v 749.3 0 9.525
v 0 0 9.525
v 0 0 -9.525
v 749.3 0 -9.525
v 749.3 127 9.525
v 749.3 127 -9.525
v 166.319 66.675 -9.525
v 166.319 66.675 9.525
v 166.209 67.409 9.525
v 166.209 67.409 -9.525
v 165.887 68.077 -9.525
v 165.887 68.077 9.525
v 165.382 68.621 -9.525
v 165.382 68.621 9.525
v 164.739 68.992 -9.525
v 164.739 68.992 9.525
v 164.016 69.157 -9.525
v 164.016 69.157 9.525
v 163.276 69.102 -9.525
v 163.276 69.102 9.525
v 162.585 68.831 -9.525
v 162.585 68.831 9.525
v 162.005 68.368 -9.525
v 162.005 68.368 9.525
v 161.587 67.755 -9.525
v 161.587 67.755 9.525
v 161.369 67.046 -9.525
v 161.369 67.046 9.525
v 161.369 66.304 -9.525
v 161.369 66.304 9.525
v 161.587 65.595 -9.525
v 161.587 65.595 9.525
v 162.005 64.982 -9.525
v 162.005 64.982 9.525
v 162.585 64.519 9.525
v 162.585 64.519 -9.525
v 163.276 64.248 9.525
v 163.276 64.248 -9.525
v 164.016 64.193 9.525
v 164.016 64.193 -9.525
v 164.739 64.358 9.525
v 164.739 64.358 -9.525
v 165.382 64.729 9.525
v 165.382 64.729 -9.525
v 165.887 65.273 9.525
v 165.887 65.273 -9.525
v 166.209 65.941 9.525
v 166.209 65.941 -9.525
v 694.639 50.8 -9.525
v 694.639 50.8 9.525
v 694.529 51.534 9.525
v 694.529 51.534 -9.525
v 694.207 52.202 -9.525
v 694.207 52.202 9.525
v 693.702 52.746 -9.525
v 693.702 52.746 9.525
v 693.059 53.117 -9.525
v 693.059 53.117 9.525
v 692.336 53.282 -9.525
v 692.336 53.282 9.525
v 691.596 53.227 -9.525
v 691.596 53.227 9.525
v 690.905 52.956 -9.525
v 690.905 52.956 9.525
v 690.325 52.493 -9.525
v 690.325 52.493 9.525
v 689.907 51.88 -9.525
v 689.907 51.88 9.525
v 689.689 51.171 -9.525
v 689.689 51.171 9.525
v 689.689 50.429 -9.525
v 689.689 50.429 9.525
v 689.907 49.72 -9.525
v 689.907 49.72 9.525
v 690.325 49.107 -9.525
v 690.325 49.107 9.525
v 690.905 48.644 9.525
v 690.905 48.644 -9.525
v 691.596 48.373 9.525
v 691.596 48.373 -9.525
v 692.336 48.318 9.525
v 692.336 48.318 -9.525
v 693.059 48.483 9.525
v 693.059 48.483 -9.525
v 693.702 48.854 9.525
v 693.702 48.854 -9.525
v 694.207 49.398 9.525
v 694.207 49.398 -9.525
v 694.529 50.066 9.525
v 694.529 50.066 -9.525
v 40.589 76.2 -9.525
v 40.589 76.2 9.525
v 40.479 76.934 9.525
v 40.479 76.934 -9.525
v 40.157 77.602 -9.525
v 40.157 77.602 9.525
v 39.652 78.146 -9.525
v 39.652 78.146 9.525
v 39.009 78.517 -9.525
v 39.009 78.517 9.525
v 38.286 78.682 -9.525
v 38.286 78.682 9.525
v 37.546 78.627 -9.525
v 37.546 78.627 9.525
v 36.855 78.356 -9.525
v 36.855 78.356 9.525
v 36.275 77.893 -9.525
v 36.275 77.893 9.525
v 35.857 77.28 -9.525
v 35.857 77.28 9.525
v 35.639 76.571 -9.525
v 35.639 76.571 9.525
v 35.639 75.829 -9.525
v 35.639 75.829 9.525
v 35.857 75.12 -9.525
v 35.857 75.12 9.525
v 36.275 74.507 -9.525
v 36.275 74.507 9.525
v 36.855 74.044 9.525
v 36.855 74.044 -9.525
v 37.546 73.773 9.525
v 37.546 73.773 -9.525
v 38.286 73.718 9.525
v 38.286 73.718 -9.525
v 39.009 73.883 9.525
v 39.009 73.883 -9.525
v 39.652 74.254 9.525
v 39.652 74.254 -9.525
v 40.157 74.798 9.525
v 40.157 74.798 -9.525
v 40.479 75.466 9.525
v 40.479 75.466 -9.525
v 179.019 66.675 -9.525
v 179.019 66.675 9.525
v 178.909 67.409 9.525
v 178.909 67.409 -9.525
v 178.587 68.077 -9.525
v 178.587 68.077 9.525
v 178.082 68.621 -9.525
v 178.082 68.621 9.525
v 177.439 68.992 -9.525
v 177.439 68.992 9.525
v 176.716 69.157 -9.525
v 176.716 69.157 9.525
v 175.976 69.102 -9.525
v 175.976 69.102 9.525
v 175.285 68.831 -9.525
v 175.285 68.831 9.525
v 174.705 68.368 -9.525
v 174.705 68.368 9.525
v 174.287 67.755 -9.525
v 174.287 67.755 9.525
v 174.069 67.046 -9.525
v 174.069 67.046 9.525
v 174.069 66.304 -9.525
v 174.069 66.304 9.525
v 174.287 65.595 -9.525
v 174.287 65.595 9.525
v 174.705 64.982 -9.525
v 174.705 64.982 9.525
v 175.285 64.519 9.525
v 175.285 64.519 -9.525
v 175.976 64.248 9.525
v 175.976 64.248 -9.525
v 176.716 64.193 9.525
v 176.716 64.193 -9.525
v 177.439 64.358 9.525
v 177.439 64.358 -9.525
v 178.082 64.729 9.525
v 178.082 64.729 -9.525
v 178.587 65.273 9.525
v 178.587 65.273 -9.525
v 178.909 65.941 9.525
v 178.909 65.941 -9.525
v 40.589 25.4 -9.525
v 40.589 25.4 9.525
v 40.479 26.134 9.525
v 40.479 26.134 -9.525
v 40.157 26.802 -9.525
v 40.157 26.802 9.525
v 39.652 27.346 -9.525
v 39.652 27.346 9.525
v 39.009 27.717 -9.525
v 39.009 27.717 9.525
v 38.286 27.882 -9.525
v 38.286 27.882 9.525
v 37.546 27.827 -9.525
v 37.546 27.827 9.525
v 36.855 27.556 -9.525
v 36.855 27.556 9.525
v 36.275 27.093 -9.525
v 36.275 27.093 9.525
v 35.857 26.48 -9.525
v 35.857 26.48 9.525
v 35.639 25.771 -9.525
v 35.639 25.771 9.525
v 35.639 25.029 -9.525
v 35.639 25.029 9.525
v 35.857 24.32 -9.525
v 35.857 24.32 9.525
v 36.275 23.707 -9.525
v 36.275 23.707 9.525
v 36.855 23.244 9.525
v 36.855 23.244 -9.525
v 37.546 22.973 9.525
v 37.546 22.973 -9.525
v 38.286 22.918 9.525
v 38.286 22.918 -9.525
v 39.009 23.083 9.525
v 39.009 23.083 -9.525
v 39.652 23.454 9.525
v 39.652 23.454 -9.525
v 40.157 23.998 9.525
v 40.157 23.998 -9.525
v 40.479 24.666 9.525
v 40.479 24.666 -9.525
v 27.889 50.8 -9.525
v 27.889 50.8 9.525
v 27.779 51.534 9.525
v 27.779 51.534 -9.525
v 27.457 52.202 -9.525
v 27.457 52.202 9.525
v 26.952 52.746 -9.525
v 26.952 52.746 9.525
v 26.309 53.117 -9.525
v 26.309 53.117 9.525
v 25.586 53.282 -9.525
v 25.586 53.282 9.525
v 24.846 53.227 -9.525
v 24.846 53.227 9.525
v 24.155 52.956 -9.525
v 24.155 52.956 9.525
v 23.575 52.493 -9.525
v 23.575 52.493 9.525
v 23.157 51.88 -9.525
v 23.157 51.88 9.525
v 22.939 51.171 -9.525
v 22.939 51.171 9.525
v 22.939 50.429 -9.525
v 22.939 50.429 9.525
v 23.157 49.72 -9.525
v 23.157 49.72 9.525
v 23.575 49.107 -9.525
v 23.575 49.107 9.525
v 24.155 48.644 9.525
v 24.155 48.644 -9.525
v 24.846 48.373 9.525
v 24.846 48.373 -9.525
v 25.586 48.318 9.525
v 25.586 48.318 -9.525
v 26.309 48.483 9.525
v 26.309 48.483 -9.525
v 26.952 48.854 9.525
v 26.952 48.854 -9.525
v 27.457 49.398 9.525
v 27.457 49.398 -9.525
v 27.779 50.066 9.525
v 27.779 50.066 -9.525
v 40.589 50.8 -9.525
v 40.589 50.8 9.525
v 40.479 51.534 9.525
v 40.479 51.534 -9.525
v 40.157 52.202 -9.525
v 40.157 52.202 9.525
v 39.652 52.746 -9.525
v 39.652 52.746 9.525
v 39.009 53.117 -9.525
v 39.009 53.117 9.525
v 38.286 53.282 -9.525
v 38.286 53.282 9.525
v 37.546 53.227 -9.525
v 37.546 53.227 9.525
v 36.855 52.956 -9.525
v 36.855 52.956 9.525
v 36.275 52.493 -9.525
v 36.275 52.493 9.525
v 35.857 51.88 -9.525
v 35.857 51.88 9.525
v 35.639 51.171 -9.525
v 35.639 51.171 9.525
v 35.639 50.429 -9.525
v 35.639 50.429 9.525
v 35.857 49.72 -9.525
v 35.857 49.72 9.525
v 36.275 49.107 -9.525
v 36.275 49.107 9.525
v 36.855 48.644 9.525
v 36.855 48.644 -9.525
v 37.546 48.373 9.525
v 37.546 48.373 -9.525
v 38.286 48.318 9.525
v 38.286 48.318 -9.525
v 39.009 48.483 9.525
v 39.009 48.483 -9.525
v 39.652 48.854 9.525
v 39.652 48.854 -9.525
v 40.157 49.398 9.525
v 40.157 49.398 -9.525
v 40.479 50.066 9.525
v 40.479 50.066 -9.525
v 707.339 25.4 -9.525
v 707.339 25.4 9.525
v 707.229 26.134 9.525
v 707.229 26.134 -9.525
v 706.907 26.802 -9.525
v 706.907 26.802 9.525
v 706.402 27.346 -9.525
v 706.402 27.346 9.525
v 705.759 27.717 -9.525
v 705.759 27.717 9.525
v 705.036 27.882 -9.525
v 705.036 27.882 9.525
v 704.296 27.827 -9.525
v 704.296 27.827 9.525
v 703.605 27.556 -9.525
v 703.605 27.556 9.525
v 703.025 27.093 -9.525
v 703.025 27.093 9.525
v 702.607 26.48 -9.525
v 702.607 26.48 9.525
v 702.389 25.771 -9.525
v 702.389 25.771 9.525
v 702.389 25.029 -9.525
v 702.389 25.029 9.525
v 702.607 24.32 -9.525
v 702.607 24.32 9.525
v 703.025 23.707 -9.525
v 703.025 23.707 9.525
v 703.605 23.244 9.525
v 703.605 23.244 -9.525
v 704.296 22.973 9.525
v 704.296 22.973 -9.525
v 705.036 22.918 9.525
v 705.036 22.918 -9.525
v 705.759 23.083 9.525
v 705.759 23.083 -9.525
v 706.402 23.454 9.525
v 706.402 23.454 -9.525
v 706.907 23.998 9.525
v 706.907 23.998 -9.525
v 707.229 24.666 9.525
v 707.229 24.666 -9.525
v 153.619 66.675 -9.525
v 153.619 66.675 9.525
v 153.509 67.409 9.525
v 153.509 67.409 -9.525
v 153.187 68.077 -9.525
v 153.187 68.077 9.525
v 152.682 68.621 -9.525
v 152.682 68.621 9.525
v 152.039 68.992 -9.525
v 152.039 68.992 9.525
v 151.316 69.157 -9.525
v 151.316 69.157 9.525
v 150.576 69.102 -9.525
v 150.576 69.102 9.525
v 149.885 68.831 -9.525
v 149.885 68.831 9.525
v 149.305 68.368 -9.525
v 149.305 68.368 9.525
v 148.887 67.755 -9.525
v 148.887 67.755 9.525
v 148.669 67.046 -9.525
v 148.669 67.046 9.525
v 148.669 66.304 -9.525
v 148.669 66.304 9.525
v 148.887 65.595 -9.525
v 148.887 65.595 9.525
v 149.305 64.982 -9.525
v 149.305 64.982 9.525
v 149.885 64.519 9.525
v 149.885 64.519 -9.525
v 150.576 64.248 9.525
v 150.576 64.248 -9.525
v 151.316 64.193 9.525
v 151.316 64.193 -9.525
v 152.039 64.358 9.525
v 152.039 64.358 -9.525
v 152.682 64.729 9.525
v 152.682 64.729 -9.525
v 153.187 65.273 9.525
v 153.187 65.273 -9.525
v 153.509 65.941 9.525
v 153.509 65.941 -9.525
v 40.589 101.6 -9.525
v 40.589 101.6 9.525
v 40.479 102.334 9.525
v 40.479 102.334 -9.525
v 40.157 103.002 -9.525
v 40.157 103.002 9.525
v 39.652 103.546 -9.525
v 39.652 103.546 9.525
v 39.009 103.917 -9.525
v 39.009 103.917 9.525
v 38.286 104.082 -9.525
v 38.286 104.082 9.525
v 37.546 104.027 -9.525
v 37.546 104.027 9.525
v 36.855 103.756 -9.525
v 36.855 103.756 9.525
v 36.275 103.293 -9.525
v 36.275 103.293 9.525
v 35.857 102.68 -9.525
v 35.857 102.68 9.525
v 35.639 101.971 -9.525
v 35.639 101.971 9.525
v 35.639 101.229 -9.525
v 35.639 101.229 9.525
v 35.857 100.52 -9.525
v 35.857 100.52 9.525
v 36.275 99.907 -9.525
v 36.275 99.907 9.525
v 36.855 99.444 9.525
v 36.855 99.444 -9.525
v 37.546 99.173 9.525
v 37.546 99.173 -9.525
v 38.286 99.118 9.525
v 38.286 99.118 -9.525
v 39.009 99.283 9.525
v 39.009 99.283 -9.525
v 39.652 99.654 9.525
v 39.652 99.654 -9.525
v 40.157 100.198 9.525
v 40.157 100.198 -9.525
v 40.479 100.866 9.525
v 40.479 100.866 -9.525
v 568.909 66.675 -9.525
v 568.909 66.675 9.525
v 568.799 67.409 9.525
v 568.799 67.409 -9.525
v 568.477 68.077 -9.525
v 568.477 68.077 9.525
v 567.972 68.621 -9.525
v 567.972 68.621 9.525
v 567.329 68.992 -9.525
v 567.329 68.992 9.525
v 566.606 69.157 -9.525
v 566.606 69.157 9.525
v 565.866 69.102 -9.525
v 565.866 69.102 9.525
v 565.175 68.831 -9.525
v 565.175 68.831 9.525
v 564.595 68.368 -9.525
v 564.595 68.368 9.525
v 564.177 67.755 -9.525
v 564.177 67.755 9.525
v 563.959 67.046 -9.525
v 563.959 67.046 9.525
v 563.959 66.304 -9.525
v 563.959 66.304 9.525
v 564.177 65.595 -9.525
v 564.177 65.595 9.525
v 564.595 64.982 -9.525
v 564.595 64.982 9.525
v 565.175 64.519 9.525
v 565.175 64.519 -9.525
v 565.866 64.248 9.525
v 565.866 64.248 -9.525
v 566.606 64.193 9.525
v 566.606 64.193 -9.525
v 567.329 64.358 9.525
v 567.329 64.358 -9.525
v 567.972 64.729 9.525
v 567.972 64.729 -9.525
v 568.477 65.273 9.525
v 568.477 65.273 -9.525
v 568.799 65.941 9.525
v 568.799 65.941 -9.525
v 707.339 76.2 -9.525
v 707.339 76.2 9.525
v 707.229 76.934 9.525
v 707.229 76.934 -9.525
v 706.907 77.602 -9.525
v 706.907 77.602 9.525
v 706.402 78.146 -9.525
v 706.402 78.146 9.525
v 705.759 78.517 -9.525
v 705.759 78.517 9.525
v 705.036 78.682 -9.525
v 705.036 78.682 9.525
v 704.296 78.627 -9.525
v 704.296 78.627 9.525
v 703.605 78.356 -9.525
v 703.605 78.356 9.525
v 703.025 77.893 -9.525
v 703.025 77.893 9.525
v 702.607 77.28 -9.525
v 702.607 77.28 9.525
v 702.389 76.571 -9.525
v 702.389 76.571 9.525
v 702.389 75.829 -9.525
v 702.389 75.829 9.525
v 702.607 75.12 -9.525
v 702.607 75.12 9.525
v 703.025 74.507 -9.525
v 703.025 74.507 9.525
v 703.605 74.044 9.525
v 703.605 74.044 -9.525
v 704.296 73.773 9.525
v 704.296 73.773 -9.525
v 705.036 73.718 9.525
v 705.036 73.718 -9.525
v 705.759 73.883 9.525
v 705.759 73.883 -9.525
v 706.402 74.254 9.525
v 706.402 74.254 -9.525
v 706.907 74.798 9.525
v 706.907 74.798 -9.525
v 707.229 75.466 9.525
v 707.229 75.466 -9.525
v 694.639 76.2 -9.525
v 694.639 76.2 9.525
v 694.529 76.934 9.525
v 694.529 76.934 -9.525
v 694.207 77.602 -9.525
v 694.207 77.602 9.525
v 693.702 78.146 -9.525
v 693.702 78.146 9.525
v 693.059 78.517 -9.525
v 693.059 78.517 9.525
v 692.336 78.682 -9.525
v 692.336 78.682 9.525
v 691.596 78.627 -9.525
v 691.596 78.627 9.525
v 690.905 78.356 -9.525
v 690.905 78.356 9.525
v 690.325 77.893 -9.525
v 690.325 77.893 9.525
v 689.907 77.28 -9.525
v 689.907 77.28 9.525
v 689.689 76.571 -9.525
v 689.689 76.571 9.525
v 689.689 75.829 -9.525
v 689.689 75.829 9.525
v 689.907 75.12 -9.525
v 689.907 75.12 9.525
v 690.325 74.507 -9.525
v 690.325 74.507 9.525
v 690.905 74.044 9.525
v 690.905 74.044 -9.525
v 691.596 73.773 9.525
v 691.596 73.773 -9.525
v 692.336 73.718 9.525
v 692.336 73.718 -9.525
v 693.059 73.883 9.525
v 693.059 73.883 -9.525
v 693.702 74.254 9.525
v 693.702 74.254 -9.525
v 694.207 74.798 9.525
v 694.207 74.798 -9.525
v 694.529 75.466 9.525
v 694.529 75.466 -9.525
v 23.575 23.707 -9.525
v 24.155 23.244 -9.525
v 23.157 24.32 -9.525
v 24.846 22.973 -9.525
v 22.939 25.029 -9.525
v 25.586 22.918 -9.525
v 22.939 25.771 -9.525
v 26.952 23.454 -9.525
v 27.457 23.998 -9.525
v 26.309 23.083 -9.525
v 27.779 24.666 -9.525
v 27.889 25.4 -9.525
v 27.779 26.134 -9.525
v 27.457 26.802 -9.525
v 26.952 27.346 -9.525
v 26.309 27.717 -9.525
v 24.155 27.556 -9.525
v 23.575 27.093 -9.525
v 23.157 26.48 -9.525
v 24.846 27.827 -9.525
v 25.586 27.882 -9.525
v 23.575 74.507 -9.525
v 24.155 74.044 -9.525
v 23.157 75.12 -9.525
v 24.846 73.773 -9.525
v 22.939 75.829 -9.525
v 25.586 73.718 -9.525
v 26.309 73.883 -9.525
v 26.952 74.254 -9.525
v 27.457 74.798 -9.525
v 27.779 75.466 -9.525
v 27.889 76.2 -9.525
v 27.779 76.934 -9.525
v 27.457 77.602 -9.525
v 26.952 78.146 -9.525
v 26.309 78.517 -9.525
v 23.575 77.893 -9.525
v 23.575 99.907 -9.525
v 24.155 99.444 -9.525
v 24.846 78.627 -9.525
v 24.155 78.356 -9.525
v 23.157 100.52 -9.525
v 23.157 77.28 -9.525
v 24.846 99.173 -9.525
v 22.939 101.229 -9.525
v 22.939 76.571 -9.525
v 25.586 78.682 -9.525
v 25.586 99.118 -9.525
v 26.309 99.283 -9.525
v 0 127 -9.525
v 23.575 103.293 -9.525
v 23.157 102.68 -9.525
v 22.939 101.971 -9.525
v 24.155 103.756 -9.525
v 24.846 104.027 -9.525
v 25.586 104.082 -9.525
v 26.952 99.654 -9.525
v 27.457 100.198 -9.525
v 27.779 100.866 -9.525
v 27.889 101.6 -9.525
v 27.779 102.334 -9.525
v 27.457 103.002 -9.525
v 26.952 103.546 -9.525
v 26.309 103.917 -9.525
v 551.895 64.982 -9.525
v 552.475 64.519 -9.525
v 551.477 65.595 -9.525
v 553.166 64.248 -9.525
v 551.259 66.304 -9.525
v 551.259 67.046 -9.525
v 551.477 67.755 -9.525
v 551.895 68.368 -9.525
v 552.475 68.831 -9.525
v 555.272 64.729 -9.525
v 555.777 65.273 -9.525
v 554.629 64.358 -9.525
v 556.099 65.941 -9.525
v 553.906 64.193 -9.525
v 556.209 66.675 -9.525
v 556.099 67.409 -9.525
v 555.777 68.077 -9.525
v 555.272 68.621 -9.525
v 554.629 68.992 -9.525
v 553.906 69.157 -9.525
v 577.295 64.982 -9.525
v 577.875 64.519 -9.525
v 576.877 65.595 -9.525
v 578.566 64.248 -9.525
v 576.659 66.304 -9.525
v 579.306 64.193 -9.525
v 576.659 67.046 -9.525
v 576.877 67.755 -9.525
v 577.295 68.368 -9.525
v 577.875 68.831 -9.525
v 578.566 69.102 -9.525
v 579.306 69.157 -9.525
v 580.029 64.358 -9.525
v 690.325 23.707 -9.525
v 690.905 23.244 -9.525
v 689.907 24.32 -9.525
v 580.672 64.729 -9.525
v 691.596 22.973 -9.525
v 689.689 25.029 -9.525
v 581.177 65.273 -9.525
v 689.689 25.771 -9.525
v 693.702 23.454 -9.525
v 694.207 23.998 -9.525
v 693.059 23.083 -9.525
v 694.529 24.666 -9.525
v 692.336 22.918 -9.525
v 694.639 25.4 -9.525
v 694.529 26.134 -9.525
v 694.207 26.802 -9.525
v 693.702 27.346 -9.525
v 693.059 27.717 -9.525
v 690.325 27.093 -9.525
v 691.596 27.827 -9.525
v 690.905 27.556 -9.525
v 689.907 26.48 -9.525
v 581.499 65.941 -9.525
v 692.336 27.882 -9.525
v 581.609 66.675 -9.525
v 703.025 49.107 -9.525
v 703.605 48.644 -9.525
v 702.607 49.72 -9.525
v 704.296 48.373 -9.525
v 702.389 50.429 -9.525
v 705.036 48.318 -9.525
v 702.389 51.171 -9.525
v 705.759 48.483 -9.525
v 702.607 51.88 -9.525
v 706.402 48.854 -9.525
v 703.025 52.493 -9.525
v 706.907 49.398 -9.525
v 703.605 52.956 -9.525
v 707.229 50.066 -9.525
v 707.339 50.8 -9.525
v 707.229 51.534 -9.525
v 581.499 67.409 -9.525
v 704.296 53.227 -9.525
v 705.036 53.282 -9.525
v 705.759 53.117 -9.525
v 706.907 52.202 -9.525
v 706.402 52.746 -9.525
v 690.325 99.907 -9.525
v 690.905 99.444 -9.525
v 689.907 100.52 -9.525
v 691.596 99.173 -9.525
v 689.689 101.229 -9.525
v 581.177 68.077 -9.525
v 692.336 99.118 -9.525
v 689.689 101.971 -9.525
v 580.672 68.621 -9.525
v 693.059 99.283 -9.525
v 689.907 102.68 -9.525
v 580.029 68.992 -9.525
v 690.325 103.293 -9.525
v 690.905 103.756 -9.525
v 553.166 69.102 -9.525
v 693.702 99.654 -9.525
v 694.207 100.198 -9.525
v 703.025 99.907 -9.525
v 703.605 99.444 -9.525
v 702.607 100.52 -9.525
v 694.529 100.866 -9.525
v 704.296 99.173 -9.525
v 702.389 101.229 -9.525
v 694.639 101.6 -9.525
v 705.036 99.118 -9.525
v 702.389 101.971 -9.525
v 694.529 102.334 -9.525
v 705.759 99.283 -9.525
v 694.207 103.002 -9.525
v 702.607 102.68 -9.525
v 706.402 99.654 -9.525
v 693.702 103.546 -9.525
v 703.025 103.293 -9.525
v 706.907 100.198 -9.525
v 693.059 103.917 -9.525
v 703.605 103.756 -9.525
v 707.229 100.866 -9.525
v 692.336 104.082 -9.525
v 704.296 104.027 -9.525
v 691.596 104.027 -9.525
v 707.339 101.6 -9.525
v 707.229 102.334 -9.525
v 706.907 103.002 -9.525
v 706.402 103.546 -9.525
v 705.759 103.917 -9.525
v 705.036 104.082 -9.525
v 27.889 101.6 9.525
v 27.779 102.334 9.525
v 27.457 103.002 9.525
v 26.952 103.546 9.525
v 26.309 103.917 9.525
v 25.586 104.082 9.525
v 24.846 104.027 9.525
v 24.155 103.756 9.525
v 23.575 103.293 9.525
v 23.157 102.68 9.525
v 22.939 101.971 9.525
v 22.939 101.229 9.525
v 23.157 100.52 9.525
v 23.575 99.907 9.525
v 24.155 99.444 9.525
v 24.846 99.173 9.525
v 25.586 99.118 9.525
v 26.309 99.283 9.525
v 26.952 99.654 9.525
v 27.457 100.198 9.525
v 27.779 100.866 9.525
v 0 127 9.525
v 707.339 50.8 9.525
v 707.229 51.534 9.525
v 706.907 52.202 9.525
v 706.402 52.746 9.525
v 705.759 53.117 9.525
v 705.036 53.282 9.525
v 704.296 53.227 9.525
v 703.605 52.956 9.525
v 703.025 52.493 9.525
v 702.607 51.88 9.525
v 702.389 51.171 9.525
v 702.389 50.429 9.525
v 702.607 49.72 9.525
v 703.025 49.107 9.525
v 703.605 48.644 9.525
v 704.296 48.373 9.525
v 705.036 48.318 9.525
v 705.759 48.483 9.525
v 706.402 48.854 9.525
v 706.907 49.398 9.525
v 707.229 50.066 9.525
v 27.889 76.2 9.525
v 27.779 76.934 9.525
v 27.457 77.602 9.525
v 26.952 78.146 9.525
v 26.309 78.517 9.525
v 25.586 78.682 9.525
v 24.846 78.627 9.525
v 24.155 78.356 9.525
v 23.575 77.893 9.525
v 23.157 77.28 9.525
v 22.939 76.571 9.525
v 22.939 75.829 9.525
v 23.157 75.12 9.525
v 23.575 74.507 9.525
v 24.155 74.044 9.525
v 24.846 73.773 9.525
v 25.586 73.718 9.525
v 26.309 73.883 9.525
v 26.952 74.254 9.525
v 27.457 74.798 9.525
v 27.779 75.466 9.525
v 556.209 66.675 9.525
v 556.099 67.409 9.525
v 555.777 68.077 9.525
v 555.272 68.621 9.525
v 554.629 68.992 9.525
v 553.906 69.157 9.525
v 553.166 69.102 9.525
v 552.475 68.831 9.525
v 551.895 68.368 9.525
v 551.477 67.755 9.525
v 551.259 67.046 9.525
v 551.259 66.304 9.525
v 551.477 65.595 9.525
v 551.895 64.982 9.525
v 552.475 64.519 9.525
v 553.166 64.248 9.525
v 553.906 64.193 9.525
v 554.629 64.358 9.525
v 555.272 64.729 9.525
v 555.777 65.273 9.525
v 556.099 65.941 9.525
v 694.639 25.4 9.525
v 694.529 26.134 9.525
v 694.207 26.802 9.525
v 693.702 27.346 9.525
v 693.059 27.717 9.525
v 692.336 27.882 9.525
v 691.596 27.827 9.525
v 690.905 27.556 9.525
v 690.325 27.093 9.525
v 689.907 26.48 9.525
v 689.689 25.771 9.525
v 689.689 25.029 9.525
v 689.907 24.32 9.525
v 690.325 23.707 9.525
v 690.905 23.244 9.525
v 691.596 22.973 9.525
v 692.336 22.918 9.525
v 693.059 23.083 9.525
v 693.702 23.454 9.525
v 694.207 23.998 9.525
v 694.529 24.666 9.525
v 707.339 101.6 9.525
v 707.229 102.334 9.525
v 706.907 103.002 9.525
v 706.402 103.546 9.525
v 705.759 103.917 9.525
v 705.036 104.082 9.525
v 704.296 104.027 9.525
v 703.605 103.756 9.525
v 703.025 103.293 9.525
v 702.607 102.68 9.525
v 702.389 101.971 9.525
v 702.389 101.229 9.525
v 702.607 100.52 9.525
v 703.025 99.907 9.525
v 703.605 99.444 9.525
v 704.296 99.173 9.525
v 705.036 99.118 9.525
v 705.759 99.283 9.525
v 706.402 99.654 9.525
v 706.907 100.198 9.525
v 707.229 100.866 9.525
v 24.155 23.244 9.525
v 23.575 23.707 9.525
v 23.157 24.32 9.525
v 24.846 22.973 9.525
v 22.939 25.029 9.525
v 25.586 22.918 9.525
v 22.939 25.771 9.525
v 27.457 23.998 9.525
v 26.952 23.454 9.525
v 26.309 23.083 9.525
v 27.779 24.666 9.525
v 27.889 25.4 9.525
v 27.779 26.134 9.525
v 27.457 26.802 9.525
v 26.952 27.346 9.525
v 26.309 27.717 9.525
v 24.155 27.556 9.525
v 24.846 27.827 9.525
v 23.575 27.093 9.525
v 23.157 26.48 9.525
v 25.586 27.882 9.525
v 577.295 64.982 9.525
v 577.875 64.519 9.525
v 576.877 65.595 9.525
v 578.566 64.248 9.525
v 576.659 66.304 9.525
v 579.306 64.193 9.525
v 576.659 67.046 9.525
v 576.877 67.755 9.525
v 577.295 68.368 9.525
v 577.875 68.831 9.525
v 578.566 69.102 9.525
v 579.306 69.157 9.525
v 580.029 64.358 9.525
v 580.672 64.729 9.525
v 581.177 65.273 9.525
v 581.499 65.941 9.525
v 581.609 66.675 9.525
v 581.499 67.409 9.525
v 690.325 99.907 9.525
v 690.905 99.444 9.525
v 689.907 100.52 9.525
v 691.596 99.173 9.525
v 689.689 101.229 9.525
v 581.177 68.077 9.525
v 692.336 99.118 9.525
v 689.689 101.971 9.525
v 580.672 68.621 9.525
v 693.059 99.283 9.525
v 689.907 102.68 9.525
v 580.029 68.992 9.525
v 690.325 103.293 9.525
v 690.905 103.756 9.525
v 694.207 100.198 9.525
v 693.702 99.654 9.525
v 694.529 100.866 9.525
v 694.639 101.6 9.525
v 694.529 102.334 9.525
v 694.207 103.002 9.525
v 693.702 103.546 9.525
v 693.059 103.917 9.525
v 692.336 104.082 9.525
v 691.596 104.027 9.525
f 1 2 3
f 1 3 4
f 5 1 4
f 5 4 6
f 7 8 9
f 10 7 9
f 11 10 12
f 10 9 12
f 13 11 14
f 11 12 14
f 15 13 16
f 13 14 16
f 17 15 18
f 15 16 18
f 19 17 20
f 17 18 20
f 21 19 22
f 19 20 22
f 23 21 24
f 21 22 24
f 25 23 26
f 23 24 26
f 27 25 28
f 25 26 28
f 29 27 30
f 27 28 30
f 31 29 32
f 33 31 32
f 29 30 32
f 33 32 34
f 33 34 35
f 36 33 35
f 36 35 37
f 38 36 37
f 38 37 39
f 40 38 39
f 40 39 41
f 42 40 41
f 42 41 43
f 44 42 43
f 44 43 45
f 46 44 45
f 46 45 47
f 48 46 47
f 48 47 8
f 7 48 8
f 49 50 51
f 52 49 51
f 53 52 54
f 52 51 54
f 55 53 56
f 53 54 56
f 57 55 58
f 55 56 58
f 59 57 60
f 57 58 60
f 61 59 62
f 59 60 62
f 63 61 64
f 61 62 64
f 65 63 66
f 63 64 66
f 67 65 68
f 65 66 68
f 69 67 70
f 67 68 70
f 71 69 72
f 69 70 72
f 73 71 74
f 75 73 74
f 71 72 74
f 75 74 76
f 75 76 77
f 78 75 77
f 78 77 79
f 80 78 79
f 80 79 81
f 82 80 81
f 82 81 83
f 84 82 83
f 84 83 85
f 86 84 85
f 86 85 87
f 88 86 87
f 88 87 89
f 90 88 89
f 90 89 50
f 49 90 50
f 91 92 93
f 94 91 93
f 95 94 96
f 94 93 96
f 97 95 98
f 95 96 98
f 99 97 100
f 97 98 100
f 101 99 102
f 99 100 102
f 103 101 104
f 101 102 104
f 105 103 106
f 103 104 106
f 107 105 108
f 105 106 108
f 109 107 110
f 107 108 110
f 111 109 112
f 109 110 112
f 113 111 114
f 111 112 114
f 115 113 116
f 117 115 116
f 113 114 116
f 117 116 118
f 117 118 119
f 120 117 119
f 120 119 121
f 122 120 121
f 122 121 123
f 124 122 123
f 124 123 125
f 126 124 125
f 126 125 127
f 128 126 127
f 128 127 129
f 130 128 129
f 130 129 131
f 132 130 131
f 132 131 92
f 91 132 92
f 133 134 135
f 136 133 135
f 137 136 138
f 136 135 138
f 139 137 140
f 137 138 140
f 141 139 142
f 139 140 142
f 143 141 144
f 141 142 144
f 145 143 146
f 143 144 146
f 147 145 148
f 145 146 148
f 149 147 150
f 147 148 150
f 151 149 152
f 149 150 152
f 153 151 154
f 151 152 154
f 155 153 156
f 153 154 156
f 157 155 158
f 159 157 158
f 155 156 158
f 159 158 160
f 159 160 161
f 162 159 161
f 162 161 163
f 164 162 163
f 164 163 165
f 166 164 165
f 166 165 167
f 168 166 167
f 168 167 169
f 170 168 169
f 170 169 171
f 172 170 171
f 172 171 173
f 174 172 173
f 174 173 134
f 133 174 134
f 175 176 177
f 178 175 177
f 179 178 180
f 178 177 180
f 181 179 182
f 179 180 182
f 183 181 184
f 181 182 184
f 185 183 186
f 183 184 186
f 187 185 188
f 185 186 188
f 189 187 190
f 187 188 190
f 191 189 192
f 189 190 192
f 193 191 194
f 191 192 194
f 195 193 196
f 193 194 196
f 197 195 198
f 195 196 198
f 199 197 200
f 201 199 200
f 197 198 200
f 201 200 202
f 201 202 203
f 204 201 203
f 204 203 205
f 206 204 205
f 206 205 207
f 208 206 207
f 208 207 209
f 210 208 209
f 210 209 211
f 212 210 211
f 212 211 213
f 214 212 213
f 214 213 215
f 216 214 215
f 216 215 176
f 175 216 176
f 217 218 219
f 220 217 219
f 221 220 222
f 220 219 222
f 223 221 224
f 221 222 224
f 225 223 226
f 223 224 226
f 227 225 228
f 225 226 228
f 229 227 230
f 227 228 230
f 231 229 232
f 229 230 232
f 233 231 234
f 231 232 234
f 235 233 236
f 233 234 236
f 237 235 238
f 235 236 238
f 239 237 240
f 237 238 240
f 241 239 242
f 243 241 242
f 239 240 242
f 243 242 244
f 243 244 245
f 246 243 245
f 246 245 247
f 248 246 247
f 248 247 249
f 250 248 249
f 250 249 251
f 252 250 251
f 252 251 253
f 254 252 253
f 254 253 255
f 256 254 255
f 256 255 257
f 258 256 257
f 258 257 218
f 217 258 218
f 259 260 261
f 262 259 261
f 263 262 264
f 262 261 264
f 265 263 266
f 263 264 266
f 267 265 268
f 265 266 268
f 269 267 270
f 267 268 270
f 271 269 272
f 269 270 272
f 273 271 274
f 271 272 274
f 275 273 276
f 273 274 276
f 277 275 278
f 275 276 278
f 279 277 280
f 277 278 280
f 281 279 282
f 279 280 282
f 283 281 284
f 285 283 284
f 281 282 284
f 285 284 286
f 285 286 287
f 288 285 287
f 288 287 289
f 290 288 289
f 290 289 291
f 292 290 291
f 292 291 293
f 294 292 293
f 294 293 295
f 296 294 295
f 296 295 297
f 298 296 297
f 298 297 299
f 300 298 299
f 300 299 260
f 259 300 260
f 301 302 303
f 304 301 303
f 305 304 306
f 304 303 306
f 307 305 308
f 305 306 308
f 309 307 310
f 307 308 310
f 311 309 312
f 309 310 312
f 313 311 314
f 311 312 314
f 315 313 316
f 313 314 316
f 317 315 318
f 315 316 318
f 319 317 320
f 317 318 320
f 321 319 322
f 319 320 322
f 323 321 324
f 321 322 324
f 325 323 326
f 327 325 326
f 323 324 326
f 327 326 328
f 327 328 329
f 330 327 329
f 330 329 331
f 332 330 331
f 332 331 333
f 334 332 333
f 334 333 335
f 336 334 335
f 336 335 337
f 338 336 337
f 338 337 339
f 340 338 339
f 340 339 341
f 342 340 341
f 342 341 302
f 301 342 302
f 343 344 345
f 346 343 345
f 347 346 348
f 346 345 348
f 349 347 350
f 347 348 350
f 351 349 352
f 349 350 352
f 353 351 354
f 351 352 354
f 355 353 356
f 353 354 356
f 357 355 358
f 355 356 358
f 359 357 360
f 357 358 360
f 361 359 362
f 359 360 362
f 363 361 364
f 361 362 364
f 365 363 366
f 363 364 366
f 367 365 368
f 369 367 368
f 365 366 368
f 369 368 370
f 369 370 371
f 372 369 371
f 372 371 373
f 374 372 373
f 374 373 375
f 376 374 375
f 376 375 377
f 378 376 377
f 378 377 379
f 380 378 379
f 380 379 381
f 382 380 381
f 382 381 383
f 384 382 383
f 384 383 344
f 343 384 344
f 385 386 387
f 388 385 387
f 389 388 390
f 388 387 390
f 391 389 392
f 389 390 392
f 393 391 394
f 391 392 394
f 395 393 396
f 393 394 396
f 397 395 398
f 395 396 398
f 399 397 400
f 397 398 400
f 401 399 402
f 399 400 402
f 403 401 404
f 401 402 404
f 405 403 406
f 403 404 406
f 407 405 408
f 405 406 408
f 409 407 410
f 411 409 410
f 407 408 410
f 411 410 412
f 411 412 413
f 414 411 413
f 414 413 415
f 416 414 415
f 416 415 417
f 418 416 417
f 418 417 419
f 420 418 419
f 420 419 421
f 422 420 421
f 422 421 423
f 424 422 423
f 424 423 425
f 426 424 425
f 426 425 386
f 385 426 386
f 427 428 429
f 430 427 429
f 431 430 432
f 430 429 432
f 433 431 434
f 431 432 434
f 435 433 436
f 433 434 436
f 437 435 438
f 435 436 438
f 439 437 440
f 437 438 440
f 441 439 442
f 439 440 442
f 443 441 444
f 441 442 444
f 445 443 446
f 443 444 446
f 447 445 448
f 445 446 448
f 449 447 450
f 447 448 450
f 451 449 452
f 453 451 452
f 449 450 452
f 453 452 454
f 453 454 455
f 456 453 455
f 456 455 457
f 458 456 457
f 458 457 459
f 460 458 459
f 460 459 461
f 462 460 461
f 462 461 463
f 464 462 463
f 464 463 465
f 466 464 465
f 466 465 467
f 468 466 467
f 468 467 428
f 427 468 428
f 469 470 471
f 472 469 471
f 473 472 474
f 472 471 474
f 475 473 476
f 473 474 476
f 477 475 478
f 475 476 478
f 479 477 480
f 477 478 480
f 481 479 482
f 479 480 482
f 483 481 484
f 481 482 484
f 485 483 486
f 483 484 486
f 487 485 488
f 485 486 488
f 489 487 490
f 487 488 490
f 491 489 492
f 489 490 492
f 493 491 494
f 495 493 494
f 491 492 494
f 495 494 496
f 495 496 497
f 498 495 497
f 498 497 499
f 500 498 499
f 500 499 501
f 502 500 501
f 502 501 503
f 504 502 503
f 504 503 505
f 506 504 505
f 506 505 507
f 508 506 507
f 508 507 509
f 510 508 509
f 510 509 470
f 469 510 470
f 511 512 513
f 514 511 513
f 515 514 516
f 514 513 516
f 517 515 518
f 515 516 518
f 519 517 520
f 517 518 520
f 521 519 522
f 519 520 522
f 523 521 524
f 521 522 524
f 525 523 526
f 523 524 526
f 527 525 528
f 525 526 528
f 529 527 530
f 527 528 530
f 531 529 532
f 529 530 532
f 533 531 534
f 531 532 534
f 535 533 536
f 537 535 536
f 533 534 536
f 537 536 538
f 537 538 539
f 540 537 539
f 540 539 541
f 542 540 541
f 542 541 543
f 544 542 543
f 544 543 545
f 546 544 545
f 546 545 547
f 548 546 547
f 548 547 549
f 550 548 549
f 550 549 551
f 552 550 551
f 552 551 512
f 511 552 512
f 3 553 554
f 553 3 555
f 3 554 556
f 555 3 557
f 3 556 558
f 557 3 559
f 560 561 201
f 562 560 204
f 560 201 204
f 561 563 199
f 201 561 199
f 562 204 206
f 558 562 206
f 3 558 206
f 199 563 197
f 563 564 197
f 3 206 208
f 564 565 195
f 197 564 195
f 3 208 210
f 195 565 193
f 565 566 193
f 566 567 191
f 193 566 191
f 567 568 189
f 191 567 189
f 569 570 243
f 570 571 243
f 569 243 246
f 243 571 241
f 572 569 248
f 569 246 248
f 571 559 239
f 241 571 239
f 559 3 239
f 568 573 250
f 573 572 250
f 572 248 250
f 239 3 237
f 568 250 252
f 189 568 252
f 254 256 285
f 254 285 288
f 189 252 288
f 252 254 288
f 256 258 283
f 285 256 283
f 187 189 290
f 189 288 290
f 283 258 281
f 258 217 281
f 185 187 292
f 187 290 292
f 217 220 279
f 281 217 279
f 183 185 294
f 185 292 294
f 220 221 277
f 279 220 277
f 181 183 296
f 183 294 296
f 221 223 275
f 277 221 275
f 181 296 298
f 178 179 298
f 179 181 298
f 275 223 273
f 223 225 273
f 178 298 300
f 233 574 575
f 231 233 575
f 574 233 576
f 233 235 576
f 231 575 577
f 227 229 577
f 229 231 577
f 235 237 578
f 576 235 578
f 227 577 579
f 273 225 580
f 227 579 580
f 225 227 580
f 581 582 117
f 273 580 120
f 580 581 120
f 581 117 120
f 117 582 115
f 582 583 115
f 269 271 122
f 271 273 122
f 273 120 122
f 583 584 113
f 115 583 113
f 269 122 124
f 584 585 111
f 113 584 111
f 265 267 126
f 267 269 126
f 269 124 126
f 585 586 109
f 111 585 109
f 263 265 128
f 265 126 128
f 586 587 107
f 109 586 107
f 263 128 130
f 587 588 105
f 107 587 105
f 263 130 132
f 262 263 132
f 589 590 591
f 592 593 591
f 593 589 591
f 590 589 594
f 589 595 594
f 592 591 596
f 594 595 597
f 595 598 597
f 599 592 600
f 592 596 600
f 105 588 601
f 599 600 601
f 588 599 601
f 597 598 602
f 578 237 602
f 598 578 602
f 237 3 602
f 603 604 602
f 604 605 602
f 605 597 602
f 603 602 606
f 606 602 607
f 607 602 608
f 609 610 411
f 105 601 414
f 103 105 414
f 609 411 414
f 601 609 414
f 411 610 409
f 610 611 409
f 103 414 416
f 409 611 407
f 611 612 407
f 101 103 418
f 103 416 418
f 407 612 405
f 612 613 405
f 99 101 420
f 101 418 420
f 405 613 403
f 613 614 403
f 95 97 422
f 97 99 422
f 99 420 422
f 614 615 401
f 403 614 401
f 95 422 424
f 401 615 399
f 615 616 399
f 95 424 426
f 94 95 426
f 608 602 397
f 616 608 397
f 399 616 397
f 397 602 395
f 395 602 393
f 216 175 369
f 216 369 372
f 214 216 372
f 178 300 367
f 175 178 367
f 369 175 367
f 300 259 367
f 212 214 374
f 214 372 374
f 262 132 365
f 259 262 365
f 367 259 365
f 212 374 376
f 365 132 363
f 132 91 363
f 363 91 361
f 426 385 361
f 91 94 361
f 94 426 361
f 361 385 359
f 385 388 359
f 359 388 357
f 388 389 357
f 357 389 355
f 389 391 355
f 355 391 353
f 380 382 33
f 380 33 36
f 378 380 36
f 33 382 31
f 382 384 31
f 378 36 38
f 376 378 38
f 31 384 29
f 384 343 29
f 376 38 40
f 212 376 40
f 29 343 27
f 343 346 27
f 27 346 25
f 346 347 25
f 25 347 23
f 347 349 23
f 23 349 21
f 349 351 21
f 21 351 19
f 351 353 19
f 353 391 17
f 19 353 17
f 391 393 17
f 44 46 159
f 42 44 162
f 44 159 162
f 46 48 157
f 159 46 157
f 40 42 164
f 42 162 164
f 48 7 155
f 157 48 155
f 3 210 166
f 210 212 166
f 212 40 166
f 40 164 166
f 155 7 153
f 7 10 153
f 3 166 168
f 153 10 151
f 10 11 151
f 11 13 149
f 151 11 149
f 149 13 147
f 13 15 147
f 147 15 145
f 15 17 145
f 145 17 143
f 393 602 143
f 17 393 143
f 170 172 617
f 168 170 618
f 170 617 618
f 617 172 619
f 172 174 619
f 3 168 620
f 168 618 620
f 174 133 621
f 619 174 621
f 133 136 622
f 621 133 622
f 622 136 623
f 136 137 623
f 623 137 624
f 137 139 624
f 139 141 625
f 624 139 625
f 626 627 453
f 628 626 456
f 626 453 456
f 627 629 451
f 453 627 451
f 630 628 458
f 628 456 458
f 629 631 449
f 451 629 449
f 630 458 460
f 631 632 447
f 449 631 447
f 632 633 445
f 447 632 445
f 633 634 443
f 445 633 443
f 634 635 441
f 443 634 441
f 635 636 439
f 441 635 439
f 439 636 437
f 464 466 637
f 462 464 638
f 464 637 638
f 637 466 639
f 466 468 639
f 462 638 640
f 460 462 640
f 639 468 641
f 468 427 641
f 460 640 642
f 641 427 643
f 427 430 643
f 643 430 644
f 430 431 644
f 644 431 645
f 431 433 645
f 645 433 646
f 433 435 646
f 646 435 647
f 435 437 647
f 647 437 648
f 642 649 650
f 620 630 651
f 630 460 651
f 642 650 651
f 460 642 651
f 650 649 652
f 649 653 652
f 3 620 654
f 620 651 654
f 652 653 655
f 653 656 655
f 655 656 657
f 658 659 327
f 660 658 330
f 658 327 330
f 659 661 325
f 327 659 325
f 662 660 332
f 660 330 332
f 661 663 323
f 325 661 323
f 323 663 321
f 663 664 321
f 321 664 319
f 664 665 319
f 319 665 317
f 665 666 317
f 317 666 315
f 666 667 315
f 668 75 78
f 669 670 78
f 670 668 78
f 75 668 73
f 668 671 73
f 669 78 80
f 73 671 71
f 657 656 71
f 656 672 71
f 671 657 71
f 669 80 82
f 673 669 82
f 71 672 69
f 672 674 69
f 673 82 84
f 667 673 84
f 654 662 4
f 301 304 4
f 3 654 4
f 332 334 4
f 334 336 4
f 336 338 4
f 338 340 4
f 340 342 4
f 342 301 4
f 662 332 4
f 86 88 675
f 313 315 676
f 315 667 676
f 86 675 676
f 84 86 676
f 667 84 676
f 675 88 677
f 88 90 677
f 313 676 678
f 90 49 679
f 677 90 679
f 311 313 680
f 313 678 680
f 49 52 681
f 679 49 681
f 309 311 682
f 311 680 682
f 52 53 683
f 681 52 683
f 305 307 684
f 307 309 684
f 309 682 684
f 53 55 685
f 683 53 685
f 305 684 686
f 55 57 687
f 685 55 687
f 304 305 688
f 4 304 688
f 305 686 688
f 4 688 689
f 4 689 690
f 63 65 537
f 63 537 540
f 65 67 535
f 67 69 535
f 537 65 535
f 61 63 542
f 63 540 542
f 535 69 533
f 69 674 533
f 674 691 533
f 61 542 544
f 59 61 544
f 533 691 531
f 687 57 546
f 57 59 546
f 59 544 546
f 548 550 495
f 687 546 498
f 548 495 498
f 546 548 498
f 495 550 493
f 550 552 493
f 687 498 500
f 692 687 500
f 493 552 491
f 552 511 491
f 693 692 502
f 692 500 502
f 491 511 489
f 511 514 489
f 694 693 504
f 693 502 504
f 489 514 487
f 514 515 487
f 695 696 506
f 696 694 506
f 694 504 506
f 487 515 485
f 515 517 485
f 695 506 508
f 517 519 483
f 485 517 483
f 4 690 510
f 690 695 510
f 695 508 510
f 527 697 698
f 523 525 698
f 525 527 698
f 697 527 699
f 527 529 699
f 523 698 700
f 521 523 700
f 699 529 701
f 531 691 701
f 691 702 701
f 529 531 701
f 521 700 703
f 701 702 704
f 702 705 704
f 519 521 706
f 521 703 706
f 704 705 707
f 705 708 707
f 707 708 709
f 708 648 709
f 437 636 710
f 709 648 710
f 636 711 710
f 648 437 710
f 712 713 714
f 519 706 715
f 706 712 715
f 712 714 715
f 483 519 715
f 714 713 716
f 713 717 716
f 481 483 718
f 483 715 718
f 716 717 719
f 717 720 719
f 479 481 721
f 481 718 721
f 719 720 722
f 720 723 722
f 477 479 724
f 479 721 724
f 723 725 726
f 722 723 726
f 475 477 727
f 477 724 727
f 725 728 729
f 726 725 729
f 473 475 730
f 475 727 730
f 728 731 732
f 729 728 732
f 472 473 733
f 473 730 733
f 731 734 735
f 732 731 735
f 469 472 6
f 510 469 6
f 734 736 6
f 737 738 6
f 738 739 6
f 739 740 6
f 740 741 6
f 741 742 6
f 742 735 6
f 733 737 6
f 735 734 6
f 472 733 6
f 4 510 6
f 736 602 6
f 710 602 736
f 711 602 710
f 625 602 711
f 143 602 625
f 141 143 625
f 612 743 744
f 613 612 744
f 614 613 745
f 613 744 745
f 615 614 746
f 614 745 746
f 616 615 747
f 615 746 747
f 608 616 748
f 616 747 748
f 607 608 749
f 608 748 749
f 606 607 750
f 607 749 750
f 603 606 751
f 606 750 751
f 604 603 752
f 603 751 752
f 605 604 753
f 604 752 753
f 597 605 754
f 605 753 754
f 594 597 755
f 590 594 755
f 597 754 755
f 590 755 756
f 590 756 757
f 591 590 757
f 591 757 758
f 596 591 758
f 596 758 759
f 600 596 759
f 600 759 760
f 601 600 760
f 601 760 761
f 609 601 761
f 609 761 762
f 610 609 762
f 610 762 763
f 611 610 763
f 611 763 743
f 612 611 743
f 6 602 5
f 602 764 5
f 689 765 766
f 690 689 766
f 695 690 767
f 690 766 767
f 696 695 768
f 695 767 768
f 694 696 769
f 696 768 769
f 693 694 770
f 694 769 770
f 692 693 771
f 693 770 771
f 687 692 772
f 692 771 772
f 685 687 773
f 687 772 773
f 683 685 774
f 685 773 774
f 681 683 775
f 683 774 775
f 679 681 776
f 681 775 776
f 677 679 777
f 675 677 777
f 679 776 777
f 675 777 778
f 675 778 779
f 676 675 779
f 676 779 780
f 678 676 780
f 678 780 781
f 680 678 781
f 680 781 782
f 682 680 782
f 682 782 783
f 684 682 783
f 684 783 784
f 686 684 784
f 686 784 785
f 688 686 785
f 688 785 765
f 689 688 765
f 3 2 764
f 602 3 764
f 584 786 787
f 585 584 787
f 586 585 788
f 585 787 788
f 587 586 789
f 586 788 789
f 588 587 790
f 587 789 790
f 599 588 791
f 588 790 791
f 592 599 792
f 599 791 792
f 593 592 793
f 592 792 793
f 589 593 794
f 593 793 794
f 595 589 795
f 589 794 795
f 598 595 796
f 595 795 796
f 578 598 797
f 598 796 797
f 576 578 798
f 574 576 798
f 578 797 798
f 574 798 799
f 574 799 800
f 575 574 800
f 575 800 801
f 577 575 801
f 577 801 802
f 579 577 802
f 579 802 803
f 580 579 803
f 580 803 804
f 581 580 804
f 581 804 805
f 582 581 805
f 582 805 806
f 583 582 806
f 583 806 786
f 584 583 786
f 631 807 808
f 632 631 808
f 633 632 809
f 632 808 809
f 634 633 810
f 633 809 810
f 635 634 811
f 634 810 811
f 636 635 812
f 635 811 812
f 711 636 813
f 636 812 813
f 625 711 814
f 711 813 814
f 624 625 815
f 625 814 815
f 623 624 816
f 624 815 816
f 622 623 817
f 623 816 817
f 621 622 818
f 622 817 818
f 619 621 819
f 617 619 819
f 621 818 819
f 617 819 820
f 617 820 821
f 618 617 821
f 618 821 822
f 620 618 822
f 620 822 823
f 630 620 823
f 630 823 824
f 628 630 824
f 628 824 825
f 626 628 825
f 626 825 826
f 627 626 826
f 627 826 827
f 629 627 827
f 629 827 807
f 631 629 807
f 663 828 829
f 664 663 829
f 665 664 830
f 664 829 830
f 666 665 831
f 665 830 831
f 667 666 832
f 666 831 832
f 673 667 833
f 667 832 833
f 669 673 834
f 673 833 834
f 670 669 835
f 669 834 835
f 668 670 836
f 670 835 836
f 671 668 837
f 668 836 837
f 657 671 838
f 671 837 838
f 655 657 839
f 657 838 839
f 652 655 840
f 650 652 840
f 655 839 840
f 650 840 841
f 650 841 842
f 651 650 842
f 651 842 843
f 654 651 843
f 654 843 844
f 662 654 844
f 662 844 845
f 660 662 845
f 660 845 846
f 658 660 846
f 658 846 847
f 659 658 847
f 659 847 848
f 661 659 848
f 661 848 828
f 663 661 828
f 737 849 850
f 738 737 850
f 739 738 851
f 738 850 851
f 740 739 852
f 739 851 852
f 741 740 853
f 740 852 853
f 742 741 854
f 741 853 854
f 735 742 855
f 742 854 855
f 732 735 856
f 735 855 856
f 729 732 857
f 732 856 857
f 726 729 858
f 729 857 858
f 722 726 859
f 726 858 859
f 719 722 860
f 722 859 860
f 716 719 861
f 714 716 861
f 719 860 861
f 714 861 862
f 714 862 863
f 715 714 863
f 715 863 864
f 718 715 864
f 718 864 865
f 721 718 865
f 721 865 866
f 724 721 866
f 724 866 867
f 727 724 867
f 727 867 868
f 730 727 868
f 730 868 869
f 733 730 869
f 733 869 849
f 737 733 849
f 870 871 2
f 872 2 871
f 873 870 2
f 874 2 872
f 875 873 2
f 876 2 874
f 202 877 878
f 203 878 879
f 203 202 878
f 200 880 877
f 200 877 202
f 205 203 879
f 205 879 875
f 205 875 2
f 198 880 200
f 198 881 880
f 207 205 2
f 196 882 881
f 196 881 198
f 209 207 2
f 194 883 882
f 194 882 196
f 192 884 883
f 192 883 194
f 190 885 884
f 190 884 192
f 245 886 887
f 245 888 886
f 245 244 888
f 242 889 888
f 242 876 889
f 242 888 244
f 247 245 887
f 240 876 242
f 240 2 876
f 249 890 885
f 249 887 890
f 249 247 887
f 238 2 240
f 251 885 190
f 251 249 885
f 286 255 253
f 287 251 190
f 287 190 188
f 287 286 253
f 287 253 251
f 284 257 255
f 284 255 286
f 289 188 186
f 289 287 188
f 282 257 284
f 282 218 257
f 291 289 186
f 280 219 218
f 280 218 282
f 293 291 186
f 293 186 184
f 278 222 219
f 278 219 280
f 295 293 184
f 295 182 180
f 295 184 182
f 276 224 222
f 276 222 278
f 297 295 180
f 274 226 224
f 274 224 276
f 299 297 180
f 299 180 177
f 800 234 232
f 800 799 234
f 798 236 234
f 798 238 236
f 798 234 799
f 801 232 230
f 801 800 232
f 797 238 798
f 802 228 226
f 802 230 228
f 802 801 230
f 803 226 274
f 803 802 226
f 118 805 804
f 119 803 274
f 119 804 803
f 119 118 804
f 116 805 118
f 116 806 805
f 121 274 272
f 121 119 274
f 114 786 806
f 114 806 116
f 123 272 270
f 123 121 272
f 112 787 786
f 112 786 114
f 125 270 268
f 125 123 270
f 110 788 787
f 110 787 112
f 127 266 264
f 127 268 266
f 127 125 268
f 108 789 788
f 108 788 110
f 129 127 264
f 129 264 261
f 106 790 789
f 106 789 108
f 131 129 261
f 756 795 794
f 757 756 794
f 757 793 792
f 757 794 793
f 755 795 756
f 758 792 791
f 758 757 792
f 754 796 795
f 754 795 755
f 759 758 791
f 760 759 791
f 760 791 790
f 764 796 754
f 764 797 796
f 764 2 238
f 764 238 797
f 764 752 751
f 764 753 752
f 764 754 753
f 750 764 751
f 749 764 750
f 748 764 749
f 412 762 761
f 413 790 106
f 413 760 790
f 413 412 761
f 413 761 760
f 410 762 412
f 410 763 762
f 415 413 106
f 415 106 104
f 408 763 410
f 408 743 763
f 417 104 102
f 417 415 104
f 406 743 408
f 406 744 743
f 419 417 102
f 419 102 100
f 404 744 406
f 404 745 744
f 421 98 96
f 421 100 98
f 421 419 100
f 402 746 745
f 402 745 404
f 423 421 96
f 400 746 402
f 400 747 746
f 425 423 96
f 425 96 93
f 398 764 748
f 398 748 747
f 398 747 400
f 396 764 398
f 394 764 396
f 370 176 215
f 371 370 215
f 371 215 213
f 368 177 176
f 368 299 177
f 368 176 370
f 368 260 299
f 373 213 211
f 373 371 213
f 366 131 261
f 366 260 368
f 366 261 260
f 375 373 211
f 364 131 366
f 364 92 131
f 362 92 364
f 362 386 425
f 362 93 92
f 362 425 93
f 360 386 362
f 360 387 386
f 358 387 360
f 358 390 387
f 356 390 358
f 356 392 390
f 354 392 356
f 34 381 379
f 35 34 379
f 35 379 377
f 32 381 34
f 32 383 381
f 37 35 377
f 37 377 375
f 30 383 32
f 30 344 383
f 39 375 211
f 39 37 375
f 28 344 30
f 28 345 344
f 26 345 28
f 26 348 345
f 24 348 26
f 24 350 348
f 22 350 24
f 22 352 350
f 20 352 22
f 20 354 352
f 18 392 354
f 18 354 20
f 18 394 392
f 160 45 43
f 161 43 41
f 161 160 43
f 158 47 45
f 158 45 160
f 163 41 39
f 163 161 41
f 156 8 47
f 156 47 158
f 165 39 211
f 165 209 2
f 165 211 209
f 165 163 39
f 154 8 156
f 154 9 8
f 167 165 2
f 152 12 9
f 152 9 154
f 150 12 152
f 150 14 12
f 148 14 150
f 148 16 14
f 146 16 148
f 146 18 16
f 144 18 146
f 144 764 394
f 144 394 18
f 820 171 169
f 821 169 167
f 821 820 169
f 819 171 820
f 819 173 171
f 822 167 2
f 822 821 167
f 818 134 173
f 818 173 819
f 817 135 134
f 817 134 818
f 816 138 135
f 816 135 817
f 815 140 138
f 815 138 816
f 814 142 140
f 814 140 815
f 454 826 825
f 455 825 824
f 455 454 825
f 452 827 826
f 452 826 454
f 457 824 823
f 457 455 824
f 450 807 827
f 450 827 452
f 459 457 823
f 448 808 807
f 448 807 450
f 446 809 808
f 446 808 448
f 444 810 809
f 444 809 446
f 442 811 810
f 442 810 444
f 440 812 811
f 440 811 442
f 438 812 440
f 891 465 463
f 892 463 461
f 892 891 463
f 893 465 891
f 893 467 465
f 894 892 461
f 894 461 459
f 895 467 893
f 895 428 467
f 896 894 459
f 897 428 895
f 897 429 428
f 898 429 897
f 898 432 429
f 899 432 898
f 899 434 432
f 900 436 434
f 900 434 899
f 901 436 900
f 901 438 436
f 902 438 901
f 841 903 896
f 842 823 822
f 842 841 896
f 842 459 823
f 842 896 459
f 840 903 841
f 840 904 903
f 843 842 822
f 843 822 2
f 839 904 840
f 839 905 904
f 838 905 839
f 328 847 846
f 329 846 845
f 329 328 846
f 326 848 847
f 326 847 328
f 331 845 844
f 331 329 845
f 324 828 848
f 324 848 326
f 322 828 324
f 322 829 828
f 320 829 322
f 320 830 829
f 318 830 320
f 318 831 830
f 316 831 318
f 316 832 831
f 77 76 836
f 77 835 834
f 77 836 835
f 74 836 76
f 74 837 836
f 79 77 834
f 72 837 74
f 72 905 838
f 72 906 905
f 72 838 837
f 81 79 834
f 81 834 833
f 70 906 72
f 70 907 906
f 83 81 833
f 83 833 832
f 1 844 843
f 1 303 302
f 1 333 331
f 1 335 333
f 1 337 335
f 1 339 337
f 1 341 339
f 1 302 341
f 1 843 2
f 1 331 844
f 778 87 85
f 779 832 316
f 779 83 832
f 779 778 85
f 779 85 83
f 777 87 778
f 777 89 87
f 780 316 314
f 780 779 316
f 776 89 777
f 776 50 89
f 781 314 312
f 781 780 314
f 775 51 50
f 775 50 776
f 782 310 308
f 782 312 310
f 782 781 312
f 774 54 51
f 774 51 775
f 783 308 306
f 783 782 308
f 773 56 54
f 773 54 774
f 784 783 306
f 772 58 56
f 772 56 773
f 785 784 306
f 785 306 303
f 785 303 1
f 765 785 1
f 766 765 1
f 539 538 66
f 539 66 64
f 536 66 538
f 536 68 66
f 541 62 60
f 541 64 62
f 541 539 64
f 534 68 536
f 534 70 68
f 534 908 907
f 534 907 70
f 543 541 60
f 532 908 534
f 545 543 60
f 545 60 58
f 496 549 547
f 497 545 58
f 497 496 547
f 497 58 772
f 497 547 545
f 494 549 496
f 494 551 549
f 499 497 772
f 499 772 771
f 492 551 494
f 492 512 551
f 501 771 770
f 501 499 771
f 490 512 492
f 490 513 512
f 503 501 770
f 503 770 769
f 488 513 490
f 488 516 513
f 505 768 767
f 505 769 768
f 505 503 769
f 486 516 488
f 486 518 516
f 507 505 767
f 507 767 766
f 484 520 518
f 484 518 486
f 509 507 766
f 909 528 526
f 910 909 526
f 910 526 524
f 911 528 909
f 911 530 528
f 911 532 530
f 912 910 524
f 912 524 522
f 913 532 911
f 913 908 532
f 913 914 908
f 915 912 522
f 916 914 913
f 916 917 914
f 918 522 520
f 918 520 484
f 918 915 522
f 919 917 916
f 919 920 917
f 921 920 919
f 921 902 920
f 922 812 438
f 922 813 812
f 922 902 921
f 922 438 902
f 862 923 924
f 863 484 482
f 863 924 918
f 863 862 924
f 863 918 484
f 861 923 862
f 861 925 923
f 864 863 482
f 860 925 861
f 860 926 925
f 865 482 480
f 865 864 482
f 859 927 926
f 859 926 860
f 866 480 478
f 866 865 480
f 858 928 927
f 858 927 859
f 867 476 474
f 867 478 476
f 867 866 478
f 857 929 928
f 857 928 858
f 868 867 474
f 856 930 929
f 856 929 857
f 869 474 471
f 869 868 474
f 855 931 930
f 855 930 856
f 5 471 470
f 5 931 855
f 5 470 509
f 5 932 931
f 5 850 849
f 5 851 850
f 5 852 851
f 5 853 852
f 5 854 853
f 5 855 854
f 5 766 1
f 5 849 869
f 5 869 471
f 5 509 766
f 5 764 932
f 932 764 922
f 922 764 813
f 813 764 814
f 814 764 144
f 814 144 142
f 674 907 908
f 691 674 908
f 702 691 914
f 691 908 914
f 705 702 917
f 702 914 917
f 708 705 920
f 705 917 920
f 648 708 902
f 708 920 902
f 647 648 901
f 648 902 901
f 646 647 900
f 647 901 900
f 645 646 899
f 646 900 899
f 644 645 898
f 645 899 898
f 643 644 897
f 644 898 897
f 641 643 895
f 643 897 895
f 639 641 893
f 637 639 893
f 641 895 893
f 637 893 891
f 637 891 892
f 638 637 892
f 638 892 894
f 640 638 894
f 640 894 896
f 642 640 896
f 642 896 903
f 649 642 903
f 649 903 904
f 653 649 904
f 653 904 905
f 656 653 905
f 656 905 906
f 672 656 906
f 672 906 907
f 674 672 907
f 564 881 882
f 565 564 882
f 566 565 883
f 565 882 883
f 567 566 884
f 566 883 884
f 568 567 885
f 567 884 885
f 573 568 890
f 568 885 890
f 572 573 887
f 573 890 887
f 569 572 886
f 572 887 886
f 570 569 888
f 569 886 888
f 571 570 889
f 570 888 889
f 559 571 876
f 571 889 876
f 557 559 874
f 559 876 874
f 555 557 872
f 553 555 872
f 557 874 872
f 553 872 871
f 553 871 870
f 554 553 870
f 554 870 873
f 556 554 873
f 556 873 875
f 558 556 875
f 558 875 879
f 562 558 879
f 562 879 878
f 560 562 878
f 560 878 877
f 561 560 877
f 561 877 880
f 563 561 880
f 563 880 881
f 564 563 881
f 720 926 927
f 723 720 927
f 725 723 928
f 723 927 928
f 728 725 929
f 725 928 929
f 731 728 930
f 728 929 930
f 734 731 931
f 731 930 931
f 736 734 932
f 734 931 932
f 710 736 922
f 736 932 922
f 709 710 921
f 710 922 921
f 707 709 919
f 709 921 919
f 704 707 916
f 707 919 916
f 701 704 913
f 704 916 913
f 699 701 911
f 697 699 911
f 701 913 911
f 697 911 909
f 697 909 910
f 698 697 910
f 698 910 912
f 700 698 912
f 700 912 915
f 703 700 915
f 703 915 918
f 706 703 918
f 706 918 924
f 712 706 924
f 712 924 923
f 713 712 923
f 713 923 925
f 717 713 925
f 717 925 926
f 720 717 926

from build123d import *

# Parameters (mm, degrees)
SKETCH1_W           = 749.3
SKETCH1_H           = 127
BOSS_EXTRUDE1_DEPTH = 9.525
SKETCH2_R           = 2.4892
CUT_EXTRUDE1_DEPTH  = 761.225224851


with BuildPart() as part:
    # Sketch1 → Boss-Extrude1 (new, symmetric)
    with BuildSketch(Plane.XY):
        with Locations((374.65, 63.5)):
            Rectangle(SKETCH1_W, SKETCH1_H)
    extrude(amount=BOSS_EXTRUDE1_DEPTH, both=True)

    # Sketch2 → Cut-Extrude1 (cut, through all)
    with BuildSketch(Plane.XY.offset(9.525)):
        with Locations((566.42, 66.675)):
            Circle(SKETCH2_R)
        with Locations((553.72, 66.675)):
            Circle(SKETCH2_R)
        with Locations((163.83, 66.675)):
            Circle(SKETCH2_R)
        with Locations((176.53, 66.675)):
            Circle(SKETCH2_R)
        with Locations((579.12, 66.675)):
            Circle(SKETCH2_R)
        with Locations((151.13, 66.675)):
            Circle(SKETCH2_R)
        with Locations((692.15, 101.6)):
            Circle(SKETCH2_R)
        with Locations((704.85, 101.6)):
            Circle(SKETCH2_R)
        with Locations((704.85, 76.2)):
            Circle(SKETCH2_R)
        with Locations((704.85, 50.8)):
            Circle(SKETCH2_R)
        with Locations((704.85, 25.4)):
            Circle(SKETCH2_R)
        with Locations((692.15, 76.2)):
            Circle(SKETCH2_R)
        with Locations((692.15, 50.8)):
            Circle(SKETCH2_R)
        with Locations((692.15, 25.4)):
            Circle(SKETCH2_R)
        with Locations((25.4, 101.6)):
            Circle(SKETCH2_R)
        with Locations((38.1, 101.6)):
            Circle(SKETCH2_R)
        with Locations((38.1, 76.2)):
            Circle(SKETCH2_R)
        with Locations((38.1, 50.8)):
            Circle(SKETCH2_R)
        with Locations((38.1, 25.4)):
            Circle(SKETCH2_R)
        with Locations((25.4, 76.2)):
            Circle(SKETCH2_R)
        with Locations((25.4, 50.8)):
            Circle(SKETCH2_R)
        with Locations((25.4, 25.4)):
            Circle(SKETCH2_R)
    extrude(amount=-CUT_EXTRUDE1_DEPTH, mode=Mode.SUBTRACT)


solid = part.part
